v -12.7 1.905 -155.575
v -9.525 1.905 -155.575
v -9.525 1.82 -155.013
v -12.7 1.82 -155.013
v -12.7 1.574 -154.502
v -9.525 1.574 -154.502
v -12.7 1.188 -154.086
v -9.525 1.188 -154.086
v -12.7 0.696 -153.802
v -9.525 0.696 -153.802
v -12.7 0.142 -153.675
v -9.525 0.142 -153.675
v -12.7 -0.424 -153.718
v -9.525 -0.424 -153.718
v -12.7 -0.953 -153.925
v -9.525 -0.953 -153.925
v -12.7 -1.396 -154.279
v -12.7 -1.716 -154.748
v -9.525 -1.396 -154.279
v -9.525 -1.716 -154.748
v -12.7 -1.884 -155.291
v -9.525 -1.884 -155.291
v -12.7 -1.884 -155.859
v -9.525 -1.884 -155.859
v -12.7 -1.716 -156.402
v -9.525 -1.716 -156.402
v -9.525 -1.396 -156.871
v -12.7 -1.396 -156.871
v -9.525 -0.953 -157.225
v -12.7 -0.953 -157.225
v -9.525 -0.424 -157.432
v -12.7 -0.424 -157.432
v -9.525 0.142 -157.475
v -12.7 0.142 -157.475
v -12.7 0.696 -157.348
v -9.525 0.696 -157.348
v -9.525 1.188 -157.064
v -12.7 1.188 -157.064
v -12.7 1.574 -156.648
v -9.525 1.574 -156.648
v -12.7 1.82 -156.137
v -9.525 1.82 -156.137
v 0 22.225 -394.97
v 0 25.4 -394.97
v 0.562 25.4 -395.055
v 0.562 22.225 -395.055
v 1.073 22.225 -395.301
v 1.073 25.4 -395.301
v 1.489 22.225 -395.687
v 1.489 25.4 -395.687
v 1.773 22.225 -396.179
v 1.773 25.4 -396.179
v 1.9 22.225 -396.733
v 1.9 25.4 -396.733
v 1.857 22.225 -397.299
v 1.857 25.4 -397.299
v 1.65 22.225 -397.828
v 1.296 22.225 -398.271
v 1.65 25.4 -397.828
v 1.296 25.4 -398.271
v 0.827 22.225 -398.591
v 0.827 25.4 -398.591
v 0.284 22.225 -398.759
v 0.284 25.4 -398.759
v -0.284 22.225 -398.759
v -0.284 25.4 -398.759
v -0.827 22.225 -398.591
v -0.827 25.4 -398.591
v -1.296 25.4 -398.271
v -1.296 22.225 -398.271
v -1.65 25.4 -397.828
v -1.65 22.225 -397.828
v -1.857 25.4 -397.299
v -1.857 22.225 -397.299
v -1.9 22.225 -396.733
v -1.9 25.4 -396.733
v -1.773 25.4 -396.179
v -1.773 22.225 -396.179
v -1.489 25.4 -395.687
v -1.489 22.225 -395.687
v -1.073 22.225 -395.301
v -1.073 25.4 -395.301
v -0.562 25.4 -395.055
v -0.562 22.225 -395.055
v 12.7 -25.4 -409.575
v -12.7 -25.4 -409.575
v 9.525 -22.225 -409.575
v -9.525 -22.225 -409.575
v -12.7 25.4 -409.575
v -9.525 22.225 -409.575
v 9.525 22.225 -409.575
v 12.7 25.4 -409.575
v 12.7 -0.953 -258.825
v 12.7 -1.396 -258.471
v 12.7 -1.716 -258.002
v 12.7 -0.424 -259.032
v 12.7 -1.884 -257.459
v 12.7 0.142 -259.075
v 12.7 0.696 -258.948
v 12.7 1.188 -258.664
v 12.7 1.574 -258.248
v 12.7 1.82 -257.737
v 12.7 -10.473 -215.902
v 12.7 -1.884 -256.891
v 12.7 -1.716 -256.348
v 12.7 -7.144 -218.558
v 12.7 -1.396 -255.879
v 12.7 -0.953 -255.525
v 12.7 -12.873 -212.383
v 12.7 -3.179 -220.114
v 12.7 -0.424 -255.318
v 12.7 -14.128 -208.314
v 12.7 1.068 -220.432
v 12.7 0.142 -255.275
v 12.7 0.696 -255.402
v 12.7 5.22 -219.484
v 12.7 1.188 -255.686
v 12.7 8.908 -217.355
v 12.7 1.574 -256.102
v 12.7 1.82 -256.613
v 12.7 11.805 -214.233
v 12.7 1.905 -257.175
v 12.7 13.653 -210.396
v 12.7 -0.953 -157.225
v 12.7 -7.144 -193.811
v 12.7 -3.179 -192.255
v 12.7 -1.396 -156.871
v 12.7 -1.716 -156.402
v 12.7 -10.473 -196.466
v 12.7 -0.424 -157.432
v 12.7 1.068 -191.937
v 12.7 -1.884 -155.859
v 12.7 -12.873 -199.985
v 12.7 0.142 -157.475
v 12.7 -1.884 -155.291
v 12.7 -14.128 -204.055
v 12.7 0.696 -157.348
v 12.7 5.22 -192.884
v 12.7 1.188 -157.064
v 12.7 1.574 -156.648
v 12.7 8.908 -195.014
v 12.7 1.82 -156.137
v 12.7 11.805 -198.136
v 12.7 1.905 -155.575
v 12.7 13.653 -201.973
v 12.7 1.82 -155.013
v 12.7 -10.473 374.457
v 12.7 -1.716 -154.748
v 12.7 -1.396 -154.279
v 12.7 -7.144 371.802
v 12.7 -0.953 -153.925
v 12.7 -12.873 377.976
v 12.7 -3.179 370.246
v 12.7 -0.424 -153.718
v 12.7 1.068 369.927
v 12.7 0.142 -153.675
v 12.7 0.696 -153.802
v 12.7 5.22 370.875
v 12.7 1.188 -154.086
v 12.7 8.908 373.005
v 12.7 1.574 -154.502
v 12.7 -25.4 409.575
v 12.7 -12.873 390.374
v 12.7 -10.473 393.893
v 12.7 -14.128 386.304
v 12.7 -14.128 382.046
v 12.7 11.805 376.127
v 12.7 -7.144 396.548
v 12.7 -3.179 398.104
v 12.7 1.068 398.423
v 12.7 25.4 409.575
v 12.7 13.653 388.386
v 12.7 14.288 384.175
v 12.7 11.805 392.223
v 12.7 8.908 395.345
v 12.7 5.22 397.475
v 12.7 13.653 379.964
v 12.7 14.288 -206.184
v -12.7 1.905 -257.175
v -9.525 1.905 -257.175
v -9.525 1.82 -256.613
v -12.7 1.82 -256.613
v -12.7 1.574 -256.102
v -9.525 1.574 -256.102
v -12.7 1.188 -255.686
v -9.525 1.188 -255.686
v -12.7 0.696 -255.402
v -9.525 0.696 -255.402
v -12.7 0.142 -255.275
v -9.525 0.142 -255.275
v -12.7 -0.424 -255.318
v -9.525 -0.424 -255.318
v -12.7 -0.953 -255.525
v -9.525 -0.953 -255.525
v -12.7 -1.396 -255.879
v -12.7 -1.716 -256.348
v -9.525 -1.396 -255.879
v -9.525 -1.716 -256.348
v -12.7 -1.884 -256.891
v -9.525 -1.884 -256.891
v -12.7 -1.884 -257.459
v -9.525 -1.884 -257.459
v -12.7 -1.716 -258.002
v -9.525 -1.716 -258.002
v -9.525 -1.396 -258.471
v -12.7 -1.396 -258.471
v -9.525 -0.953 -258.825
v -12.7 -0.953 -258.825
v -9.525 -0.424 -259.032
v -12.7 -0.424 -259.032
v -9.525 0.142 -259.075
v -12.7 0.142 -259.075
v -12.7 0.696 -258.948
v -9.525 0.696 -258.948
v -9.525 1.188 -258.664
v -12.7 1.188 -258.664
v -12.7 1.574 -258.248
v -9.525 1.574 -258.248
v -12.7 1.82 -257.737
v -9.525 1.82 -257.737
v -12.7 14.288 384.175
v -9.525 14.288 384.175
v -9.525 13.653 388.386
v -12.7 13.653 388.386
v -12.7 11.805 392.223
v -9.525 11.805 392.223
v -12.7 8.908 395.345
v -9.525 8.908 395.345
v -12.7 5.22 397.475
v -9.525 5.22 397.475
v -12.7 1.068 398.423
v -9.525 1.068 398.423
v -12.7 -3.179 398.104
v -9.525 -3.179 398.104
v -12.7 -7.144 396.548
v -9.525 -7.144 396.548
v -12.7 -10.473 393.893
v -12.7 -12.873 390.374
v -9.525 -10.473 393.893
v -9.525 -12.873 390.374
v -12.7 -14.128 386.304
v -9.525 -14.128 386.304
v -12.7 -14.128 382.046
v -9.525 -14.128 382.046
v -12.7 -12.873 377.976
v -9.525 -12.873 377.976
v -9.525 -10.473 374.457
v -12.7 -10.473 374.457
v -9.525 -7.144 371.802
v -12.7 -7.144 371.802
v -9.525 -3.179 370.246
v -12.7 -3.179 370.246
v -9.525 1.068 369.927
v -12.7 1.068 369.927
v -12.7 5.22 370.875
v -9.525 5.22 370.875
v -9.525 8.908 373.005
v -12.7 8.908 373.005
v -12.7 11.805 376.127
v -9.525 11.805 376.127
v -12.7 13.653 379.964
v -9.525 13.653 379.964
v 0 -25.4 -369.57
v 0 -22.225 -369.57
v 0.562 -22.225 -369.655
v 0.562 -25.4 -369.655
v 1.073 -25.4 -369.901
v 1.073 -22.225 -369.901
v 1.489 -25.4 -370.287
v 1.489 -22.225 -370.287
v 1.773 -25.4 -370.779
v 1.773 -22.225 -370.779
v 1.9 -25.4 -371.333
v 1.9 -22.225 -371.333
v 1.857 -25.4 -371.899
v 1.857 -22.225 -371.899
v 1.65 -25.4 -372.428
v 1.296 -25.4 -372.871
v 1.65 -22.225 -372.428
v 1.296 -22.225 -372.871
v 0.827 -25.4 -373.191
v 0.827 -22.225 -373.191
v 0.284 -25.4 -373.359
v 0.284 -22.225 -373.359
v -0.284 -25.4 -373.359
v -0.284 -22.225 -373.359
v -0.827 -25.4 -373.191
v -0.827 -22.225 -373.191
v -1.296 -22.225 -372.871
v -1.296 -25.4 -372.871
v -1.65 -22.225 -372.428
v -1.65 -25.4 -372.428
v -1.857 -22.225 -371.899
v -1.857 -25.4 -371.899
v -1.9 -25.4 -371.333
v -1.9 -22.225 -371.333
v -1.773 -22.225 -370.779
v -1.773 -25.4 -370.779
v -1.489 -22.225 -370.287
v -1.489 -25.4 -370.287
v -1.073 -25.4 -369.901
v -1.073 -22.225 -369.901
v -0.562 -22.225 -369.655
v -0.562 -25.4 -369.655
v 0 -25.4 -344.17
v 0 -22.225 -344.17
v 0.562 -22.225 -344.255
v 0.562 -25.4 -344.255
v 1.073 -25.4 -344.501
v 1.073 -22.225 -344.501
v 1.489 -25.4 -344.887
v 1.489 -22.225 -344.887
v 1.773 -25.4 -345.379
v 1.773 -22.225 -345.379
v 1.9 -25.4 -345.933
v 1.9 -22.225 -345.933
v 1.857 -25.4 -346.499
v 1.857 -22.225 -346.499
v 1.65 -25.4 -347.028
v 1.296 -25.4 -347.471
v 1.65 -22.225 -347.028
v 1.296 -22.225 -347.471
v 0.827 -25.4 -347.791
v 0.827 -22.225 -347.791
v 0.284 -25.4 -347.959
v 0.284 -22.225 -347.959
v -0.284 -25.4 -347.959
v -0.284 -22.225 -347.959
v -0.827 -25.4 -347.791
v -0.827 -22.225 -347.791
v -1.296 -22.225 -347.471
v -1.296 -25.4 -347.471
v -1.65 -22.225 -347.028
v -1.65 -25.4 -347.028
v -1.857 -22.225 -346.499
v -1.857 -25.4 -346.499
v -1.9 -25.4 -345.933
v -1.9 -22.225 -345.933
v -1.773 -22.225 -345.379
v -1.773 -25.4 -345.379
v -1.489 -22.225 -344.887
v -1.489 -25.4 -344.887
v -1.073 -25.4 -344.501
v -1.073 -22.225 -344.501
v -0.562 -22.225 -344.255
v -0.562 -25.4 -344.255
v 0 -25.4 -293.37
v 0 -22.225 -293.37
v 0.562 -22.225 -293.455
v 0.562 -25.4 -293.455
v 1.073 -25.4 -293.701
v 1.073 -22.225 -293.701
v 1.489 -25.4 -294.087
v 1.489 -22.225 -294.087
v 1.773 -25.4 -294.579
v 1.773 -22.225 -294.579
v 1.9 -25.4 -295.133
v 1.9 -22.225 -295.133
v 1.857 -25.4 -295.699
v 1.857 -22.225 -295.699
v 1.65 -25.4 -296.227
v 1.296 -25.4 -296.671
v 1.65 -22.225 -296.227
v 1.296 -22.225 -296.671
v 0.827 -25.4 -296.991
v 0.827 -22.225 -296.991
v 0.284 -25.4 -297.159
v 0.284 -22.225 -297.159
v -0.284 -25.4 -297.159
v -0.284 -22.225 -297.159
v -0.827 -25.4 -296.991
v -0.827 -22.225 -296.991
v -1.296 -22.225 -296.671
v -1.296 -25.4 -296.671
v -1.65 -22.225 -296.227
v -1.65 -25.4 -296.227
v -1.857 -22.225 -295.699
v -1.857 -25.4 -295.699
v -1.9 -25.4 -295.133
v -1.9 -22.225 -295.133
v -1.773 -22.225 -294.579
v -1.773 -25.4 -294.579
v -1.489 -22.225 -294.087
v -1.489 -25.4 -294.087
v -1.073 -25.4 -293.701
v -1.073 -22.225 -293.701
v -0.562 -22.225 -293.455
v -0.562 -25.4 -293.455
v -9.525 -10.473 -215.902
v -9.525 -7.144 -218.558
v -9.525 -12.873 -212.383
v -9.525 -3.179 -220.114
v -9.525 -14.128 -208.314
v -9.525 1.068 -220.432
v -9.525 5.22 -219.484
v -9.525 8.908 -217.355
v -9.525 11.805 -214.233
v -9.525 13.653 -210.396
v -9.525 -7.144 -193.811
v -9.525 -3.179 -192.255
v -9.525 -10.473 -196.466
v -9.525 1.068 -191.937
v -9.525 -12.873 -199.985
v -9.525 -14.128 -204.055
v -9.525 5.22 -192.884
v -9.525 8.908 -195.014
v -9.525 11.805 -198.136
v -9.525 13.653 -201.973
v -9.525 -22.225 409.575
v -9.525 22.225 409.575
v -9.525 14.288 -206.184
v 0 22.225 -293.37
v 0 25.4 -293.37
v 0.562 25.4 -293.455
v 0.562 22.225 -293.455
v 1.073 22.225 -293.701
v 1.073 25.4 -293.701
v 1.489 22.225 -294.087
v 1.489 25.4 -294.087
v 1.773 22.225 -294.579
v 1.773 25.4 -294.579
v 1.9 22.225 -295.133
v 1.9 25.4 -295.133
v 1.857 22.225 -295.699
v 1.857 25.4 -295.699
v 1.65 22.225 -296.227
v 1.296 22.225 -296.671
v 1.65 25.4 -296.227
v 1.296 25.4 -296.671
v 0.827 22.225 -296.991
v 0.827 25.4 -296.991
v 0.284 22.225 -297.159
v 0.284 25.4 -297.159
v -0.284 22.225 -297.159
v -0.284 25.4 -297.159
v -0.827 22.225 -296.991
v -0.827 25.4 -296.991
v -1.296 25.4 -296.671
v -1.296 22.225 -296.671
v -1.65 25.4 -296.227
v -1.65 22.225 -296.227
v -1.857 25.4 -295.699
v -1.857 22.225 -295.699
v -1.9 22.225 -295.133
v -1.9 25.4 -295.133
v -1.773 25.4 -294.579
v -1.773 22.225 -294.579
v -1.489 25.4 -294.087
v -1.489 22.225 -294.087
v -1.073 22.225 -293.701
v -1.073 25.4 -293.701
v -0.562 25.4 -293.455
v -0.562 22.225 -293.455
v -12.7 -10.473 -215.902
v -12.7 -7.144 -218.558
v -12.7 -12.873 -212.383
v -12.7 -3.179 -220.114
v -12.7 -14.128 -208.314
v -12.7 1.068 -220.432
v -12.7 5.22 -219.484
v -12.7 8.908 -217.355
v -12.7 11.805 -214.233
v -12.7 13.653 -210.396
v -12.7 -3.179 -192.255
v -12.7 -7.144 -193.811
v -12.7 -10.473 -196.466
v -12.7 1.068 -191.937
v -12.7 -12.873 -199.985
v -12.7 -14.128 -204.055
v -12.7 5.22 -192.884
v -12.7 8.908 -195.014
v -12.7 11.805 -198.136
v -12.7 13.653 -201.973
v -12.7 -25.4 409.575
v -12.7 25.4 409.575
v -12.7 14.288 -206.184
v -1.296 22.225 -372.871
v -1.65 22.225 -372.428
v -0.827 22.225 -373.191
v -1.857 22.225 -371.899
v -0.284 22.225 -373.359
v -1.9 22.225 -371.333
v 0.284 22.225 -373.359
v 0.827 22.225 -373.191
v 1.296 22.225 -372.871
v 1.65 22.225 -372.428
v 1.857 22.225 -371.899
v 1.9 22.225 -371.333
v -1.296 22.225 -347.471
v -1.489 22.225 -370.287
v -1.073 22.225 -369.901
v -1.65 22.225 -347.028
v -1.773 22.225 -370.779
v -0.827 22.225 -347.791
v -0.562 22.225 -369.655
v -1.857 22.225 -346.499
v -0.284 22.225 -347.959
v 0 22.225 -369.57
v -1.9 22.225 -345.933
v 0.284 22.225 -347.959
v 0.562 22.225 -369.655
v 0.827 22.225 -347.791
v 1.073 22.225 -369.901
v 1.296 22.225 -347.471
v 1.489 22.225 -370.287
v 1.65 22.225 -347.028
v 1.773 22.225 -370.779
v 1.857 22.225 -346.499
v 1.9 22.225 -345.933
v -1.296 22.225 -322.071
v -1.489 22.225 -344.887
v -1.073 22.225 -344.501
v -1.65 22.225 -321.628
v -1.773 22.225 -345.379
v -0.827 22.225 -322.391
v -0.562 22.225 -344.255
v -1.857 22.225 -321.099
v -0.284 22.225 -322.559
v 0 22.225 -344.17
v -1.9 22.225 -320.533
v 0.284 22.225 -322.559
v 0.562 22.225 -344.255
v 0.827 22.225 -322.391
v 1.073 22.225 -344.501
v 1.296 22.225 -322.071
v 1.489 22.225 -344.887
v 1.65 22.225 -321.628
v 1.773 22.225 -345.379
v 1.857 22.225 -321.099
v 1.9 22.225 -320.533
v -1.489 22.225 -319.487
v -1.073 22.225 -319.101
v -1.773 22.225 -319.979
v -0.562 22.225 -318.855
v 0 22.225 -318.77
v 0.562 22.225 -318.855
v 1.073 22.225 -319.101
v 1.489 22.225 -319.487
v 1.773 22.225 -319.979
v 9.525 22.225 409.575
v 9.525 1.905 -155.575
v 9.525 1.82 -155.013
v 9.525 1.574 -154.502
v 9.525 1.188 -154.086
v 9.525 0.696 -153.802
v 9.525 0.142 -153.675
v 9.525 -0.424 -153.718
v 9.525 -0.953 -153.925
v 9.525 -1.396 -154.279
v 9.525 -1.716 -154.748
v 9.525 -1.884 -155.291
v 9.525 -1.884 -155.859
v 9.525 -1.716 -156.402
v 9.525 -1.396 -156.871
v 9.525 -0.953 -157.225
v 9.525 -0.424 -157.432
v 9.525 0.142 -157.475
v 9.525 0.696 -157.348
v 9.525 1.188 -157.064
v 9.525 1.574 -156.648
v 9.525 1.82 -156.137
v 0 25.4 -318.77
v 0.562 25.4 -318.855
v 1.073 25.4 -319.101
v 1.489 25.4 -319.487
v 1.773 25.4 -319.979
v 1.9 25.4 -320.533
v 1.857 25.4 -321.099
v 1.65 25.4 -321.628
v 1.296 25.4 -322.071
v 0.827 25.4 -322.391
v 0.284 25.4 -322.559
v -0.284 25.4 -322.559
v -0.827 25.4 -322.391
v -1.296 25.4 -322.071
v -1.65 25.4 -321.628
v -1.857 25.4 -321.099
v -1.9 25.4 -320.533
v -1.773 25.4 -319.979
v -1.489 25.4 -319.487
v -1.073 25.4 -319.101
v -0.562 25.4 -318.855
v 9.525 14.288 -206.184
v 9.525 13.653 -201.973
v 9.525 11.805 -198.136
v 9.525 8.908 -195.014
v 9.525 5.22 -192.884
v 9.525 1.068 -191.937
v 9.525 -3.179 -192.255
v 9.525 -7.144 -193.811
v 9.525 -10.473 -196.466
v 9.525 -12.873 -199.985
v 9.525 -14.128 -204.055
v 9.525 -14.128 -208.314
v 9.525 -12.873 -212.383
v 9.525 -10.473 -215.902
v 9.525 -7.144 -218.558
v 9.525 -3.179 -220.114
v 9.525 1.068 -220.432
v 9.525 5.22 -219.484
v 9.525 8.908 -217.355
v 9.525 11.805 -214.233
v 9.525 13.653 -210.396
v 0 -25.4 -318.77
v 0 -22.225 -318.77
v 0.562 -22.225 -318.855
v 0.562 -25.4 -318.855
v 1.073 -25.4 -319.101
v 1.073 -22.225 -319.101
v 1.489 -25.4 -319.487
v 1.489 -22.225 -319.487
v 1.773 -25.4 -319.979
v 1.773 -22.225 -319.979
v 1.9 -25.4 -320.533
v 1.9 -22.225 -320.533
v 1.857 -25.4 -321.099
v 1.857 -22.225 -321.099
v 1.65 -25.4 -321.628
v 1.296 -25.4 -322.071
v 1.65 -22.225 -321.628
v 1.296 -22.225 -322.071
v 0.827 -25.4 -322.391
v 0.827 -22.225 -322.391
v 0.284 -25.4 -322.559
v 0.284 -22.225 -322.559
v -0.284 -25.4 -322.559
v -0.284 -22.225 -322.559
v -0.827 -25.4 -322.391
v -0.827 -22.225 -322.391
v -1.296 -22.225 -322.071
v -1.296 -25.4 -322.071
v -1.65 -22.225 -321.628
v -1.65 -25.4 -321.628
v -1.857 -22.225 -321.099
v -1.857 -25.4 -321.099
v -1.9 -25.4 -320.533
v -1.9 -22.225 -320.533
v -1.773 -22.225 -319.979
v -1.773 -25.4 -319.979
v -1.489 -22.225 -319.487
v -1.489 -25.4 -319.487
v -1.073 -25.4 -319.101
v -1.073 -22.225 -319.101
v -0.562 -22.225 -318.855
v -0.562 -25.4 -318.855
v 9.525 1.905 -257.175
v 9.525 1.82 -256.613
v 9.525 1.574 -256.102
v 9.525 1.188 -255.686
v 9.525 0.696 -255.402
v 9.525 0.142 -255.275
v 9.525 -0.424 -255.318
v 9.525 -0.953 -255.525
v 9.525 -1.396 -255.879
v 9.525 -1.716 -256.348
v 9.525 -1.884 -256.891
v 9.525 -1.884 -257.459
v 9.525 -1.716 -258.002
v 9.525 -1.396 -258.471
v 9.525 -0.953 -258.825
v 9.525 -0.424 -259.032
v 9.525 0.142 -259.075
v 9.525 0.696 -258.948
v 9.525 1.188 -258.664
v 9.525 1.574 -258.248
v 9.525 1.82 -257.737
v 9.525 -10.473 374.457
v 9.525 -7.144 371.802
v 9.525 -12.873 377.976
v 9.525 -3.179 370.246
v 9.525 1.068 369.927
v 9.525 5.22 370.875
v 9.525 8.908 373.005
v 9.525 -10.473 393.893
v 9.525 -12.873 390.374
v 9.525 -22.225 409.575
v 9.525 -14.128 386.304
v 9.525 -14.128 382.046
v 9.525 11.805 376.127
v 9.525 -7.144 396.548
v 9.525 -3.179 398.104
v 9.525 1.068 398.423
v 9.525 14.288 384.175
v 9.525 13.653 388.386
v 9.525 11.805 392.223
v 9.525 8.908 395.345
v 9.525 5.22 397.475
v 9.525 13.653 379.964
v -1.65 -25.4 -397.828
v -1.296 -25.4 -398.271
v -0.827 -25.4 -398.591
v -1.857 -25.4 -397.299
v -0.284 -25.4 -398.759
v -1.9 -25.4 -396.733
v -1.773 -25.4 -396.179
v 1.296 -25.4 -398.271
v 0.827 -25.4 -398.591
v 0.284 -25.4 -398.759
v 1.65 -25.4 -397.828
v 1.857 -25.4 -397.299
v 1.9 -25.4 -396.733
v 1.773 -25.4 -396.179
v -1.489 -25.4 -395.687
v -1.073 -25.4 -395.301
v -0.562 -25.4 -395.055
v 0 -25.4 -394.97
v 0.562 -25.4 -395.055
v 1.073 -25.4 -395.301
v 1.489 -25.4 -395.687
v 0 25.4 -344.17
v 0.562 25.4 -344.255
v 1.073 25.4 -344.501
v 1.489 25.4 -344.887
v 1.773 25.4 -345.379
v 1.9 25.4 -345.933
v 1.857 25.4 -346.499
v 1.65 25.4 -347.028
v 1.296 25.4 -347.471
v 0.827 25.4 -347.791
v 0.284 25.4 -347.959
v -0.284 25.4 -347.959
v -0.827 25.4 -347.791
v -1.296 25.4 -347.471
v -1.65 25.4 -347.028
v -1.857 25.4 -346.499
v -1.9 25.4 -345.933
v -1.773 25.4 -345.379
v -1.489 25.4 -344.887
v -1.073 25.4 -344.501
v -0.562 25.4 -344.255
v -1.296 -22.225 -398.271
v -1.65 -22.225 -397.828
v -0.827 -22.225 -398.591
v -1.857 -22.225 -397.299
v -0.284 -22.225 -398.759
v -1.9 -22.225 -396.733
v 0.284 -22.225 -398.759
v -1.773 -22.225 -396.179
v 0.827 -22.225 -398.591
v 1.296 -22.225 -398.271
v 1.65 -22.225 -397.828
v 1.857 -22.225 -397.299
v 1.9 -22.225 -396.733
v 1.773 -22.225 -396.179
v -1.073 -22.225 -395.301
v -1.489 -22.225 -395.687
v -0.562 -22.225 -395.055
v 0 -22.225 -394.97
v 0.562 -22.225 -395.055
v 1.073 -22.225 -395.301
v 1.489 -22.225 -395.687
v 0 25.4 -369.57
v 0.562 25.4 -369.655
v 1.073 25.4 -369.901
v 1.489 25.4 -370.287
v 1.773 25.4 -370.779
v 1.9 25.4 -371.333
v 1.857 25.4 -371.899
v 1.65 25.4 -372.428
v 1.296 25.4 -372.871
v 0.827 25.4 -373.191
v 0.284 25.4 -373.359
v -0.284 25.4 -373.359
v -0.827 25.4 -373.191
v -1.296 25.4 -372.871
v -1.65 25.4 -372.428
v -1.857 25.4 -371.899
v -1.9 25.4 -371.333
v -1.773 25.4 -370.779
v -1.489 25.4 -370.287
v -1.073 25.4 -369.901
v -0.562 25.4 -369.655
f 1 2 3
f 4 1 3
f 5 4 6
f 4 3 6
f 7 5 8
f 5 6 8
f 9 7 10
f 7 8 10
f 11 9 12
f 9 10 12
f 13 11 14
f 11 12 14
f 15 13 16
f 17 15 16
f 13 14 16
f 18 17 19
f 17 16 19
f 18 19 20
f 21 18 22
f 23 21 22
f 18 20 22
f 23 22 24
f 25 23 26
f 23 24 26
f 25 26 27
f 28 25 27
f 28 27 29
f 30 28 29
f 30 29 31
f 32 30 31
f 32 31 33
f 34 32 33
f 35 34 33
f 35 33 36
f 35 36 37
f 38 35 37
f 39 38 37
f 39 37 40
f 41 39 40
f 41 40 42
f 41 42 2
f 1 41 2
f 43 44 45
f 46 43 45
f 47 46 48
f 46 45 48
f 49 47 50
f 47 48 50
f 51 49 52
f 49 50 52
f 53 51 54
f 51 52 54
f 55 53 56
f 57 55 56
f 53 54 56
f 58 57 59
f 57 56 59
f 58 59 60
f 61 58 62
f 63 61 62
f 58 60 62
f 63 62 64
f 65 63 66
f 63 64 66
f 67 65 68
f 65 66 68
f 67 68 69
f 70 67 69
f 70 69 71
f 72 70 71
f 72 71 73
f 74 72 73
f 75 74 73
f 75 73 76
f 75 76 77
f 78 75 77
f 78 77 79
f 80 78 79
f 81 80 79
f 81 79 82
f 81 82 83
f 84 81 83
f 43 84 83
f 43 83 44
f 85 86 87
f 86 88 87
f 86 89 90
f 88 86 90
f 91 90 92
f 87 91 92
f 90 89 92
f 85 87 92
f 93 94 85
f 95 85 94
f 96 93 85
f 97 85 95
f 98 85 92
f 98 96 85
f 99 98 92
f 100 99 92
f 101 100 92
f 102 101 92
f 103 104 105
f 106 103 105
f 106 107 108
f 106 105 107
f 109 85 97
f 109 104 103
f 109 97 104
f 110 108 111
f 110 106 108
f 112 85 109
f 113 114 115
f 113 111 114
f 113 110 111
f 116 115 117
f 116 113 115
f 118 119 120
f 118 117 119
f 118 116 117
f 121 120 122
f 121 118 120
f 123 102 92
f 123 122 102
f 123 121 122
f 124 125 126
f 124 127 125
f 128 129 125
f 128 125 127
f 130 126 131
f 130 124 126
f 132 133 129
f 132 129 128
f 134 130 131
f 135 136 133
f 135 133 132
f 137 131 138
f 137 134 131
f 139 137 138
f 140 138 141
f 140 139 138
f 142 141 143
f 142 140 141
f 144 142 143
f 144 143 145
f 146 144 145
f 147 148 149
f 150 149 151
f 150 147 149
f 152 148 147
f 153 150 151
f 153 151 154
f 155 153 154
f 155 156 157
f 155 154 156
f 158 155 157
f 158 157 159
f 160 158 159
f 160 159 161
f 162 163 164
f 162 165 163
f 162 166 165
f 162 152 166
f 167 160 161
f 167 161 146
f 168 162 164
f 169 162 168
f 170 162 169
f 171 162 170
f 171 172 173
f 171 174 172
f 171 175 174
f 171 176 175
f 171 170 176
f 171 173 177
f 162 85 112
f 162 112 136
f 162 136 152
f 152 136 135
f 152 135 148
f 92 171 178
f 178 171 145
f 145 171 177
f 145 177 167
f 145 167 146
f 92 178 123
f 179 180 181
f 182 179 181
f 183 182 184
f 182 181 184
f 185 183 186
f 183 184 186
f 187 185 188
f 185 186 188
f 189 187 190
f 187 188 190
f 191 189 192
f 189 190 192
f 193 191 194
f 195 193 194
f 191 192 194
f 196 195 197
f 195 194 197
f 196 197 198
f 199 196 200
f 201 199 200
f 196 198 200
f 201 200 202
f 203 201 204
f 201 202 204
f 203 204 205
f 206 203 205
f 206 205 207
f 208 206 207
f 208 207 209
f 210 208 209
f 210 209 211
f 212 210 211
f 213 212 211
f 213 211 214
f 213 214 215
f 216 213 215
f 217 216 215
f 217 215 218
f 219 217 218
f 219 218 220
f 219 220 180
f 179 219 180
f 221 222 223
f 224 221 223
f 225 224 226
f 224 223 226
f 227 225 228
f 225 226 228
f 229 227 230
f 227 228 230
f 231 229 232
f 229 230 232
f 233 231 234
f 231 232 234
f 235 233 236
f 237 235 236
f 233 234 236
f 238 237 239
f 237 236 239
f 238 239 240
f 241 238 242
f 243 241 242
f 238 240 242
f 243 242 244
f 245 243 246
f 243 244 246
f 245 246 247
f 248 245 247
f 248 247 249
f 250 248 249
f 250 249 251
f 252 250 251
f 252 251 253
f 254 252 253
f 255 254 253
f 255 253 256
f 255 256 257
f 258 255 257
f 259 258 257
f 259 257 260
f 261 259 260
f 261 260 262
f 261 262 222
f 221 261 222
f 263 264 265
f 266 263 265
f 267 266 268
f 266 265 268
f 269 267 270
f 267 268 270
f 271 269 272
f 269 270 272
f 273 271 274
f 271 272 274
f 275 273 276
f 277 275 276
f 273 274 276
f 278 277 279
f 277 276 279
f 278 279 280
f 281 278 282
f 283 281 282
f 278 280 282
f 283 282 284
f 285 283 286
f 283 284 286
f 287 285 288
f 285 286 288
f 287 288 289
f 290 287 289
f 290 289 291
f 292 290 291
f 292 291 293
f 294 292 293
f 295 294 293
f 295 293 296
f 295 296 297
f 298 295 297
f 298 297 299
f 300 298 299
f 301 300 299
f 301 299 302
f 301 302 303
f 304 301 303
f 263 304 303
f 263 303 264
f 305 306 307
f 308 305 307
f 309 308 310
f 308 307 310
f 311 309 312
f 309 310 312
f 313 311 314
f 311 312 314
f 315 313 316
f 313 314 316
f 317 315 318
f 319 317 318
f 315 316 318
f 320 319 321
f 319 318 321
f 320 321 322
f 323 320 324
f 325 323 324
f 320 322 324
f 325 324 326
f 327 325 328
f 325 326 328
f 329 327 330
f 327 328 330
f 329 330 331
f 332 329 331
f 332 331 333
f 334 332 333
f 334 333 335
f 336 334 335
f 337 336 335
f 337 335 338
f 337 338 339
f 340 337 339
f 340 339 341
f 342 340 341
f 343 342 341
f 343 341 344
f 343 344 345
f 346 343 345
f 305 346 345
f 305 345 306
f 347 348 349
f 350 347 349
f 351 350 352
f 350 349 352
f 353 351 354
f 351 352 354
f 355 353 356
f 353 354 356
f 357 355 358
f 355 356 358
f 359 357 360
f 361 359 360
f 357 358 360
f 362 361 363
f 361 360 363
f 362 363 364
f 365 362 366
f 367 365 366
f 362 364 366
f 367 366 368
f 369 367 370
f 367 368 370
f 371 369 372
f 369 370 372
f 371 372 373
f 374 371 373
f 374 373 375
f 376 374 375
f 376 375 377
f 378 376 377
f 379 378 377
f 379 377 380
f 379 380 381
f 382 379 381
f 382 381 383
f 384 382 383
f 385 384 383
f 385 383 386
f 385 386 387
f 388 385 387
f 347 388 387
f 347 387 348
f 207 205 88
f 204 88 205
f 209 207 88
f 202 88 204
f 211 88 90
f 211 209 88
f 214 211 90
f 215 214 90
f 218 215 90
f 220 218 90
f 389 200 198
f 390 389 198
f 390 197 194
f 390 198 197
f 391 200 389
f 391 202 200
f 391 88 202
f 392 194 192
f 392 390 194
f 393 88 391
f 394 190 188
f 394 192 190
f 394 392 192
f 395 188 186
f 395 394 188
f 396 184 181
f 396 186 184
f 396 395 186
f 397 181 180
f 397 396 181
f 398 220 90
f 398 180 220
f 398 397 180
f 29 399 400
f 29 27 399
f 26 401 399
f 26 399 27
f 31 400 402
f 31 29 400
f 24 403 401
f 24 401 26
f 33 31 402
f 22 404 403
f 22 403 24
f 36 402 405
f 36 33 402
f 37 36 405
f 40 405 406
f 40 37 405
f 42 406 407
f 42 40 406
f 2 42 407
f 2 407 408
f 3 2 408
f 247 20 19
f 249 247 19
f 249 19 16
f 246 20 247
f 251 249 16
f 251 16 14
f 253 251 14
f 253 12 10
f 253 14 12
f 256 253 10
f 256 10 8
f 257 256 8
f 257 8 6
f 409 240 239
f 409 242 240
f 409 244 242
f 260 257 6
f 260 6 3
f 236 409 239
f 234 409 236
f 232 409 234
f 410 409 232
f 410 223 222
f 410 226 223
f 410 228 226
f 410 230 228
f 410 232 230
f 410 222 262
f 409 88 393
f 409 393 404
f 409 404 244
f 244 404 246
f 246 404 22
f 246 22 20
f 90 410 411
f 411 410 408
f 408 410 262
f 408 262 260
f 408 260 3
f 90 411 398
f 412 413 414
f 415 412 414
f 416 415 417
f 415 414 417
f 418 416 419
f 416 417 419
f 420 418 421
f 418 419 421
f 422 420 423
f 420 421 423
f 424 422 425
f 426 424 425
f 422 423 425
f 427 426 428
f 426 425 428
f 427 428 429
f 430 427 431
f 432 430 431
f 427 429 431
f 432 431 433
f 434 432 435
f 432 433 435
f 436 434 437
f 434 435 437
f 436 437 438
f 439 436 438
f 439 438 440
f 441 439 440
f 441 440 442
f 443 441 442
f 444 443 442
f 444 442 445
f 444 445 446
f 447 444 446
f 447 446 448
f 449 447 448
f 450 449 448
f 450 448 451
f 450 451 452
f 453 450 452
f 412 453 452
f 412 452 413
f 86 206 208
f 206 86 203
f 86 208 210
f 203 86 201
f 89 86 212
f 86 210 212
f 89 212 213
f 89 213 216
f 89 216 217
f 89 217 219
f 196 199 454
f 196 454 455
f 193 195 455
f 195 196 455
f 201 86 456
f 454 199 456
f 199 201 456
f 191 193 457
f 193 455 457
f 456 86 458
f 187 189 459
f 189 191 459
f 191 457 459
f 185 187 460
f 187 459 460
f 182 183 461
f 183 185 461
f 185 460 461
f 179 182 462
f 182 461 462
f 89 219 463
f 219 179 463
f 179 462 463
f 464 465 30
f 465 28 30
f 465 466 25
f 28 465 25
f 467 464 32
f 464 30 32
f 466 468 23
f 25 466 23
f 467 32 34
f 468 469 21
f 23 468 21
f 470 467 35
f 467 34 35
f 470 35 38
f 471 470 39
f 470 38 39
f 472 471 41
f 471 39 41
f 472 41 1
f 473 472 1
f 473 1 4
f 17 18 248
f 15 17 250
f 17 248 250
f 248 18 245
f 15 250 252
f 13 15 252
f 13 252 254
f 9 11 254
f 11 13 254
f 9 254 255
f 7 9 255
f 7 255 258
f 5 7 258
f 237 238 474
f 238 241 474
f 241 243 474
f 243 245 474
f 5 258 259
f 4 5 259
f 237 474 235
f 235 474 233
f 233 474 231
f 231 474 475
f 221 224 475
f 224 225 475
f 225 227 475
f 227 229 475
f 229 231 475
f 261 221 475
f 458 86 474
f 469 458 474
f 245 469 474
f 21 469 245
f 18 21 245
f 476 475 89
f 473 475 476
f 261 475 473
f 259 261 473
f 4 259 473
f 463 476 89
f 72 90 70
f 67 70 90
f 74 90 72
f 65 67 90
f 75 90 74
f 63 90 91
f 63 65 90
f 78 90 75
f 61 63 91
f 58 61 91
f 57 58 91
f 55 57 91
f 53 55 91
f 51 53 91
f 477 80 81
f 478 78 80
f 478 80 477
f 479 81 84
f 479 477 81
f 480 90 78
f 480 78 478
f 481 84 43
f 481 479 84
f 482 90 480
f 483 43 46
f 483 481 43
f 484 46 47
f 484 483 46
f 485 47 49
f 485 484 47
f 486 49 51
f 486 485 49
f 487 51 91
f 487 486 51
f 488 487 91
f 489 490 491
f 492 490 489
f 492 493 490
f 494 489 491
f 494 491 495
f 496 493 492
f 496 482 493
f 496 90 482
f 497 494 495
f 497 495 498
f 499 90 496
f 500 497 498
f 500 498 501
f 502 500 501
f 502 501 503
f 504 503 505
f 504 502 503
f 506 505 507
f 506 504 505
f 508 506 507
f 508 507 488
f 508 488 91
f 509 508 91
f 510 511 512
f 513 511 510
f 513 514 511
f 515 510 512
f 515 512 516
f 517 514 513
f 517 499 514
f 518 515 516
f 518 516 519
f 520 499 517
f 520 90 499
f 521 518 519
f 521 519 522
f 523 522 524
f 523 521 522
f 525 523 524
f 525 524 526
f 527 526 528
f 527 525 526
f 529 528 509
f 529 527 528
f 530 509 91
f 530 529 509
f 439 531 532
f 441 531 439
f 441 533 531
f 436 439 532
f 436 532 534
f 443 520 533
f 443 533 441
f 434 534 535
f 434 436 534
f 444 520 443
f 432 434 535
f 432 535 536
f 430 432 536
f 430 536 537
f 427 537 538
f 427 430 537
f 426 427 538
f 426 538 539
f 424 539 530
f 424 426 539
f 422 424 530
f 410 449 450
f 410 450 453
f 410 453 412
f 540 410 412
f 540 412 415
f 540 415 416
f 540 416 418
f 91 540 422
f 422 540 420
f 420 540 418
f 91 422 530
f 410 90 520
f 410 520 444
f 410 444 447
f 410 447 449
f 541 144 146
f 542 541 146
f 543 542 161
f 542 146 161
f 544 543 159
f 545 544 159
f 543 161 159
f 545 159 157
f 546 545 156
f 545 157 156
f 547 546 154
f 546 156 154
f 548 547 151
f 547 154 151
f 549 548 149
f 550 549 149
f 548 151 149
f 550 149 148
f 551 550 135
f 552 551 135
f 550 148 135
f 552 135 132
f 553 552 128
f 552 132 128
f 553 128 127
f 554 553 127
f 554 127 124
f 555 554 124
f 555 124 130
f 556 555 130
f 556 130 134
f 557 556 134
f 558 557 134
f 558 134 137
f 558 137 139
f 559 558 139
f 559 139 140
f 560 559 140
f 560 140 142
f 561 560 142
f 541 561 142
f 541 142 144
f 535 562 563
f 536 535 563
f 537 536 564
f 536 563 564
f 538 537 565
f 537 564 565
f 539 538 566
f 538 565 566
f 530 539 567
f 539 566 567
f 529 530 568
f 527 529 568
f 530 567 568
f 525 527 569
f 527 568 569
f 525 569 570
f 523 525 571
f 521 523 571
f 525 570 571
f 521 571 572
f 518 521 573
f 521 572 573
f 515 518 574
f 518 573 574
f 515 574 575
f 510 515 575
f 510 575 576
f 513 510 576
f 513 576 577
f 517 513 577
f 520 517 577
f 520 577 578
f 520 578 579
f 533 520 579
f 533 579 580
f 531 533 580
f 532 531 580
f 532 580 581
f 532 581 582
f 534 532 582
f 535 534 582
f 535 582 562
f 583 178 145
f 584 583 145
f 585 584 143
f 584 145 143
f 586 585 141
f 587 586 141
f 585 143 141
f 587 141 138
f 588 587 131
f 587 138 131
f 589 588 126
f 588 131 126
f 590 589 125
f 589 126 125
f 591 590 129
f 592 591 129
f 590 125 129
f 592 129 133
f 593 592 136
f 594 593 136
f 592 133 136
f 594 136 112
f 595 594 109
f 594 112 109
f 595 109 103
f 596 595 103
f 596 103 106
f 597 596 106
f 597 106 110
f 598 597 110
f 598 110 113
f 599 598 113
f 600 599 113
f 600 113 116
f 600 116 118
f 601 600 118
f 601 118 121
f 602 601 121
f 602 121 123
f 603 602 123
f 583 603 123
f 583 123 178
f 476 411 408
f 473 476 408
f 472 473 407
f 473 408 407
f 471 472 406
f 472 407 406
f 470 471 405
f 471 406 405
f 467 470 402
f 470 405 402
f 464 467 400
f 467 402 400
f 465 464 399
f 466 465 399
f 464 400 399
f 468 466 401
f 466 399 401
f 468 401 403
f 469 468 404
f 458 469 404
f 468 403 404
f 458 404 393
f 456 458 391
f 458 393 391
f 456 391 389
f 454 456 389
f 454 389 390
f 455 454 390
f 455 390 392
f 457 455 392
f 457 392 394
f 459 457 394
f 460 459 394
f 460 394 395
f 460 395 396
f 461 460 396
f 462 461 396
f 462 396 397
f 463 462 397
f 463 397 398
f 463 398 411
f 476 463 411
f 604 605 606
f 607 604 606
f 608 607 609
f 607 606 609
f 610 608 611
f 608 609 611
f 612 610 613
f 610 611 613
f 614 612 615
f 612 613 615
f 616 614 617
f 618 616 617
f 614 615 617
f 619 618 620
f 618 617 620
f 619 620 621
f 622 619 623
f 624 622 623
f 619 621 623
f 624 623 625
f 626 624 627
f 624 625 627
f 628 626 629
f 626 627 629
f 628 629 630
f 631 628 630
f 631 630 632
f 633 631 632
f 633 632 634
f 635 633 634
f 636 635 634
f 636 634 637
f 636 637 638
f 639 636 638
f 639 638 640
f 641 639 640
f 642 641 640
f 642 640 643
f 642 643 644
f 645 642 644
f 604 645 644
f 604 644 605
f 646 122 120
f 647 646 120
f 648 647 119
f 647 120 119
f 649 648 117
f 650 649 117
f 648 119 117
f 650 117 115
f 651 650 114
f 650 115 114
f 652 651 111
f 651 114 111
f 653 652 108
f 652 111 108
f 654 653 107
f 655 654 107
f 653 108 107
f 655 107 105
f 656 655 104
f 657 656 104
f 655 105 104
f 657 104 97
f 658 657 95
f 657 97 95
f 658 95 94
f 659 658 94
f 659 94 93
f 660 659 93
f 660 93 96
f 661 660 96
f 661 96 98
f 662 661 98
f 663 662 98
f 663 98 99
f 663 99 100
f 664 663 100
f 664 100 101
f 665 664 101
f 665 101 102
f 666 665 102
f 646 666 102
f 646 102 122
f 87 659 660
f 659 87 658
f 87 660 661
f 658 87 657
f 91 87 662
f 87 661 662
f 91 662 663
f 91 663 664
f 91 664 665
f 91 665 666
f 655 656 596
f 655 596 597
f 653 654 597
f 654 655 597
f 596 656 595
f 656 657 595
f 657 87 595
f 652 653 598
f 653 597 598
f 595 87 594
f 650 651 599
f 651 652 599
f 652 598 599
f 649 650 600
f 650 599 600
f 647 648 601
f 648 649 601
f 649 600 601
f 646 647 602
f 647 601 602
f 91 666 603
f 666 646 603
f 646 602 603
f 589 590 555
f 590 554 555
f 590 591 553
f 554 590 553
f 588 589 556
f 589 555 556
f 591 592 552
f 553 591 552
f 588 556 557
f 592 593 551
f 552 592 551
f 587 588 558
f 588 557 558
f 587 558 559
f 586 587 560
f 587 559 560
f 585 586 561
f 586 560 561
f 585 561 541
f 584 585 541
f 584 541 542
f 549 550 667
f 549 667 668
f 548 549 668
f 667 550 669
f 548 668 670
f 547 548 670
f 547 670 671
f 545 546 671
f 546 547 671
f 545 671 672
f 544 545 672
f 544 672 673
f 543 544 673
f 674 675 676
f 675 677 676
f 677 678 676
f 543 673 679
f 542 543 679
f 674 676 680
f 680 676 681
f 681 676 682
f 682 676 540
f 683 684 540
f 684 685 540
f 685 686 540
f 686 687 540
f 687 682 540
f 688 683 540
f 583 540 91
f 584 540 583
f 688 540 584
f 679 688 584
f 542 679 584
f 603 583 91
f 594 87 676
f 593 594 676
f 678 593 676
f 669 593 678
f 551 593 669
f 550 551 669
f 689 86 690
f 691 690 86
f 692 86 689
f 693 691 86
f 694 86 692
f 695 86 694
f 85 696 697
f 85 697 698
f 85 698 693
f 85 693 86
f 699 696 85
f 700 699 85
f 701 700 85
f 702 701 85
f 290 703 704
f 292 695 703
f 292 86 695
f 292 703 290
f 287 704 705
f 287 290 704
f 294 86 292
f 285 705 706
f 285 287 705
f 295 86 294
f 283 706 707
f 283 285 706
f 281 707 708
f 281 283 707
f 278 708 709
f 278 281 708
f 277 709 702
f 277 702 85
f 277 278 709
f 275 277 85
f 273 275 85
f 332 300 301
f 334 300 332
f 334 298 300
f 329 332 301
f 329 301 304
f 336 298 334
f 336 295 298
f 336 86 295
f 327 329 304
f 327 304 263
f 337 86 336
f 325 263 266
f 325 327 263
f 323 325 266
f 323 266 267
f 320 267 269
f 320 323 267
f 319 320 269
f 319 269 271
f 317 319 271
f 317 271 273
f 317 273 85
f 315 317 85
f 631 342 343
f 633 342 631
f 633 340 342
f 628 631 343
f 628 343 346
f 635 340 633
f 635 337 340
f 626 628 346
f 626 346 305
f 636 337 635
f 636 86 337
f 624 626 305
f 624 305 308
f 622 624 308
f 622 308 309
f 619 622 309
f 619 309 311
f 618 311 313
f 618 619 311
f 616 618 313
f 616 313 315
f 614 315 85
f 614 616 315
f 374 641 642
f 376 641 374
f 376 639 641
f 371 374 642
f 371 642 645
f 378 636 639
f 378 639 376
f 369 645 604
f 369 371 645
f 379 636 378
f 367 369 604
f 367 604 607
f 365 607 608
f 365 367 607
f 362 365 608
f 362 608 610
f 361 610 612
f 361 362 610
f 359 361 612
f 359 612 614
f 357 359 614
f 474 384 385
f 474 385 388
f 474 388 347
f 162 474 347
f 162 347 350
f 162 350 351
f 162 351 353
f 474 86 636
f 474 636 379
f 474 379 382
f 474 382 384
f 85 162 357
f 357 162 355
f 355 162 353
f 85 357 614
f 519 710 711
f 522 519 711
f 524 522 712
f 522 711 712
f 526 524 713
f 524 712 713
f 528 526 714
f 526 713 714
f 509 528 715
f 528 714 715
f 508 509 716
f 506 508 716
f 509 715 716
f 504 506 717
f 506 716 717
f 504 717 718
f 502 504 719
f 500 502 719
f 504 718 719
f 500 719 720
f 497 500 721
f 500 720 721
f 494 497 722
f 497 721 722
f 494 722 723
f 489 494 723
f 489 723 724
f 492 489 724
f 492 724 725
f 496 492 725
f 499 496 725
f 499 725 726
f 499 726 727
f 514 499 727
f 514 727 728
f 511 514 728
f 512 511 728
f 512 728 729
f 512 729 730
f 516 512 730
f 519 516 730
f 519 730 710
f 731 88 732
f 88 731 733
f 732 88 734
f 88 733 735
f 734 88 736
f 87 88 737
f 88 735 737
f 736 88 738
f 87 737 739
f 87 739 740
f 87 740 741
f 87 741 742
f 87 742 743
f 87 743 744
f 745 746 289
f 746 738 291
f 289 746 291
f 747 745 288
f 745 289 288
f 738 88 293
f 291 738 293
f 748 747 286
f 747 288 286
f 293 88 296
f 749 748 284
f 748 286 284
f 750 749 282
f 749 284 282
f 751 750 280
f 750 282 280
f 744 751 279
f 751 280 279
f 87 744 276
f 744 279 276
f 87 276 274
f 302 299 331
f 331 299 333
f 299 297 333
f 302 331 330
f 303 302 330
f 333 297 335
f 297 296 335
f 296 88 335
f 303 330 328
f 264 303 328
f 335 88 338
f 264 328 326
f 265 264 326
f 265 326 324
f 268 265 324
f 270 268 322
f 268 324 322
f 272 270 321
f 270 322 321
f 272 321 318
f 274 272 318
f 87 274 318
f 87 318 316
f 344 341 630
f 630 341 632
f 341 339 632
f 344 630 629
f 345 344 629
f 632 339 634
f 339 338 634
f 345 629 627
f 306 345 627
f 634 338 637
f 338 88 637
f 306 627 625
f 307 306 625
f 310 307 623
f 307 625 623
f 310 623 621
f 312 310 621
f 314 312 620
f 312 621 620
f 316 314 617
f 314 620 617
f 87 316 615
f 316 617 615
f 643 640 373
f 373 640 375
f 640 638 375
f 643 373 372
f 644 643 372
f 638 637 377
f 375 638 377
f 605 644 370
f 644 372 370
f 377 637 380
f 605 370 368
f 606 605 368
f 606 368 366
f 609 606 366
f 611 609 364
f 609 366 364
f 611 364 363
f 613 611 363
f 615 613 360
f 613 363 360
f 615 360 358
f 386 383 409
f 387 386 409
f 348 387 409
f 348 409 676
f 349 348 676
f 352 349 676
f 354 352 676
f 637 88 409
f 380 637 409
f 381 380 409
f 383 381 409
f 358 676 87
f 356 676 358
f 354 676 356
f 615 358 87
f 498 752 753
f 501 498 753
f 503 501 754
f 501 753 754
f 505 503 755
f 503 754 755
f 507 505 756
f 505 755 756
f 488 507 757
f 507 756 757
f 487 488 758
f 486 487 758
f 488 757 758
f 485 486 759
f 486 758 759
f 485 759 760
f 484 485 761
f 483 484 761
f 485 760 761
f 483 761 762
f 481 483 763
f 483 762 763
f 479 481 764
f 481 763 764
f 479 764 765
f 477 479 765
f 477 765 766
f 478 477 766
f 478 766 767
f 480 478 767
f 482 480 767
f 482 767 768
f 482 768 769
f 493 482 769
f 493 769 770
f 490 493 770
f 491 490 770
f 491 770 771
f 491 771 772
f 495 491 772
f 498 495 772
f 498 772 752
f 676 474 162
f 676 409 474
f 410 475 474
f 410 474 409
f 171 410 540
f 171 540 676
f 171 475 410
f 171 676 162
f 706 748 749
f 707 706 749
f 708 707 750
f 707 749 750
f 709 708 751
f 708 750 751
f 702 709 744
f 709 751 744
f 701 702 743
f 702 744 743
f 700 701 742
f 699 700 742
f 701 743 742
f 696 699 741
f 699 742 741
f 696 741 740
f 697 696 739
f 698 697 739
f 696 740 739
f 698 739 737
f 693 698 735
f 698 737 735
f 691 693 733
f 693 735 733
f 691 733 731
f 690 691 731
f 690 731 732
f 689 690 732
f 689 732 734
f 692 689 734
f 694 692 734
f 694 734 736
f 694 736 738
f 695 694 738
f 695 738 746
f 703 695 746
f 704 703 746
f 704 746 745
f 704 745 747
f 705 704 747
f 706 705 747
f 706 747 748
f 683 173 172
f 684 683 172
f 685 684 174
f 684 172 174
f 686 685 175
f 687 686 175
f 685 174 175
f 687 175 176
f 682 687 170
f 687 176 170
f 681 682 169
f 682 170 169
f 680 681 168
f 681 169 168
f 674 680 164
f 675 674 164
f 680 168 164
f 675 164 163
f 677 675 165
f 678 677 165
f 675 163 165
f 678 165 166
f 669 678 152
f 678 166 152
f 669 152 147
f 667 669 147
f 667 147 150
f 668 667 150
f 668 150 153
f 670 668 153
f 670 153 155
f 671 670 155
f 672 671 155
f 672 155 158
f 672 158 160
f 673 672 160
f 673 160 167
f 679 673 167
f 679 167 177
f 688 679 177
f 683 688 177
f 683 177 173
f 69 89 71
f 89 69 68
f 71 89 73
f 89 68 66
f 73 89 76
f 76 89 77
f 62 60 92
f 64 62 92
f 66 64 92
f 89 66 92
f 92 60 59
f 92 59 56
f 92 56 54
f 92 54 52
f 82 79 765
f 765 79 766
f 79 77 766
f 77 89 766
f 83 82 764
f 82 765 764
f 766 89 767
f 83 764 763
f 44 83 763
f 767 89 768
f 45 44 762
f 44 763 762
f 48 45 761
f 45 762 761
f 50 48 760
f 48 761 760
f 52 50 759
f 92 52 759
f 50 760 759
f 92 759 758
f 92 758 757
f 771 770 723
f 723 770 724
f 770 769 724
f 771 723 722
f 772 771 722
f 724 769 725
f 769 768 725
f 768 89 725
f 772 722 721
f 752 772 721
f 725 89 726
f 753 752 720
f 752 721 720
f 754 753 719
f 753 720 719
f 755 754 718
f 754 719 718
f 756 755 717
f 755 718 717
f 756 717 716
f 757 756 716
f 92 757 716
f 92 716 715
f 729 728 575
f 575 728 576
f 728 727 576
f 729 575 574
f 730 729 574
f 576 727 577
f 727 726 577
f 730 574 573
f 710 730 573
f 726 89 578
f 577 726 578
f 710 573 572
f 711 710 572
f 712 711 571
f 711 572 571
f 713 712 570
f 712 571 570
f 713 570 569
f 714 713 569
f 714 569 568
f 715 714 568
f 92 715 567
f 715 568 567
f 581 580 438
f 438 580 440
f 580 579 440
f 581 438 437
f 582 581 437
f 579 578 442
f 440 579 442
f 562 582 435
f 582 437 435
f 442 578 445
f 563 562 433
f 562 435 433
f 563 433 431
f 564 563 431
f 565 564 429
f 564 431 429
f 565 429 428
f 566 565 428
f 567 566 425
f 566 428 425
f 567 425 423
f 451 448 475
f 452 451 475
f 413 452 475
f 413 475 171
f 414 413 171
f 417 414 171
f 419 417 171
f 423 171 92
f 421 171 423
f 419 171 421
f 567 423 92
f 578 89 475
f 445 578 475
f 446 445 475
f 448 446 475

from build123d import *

# Parameters (mm, degrees)
SKETCH1_W           = 25.4
SKETCH1_H           = 50.8
SKETCH1_W_2         = 19.05
SKETCH1_H_2         = 44.45
BOSS_EXTRUDE1_DEPTH = 409.575
SKETCH7_R           = 1.905
CUT_EXTRUDE1_DEPTH  = 413.908719483
SKETCH8_R           = 1.905
SKETCH8_R_2         = 14.2875
CUT_EXTRUDE2_DEPTH  = 412.147176355


with BuildPart() as part:
    # Sketch1 → Boss-Extrude1 (new, symmetric)
    with BuildSketch(Plane.XY):
        Rectangle(SKETCH1_W, SKETCH1_H)
        Rectangle(SKETCH1_W_2, SKETCH1_H_2, mode=Mode.SUBTRACT)
    extrude(amount=BOSS_EXTRUDE1_DEPTH, both=True)

    # Sketch7 → Cut-Extrude1 (cut, through all)
    with BuildSketch(Plane(origin=(0, 25.4, 0), x_dir=(1, 0, 0), z_dir=(0, 1, 0))):
        with Locations(Location((0, 396.875, 0), (0, 0, 270))):
            Circle(SKETCH7_R)
        with Locations(Location((0, 371.475, 0), (0, 0, 270))):
            Circle(SKETCH7_R)
        with Locations(Location((0, 346.075, 0), (0, 0, 270))):
            Circle(SKETCH7_R)
        with Locations(Location((0, 320.675, 0), (0, 0, 270))):
            Circle(SKETCH7_R)
        with Locations(Location((0, 295.275, 0), (0, 0, 270))):
            Circle(SKETCH7_R)
    extrude(amount=-CUT_EXTRUDE1_DEPTH, mode=Mode.SUBTRACT)

    # Sketch8 → Cut-Extrude2 (cut, through all)
    with BuildSketch(Plane(origin=(12.7, 0, 0), x_dir=(0, 0, -1), z_dir=(1, 0, 0))):
        with Locations(Location((155.575, 0, 0), (0, 0, 90))):
            Circle(SKETCH8_R)
        with Locations(Location((257.175, 0, 0), (0, 0, 90))):
            Circle(SKETCH8_R)
        with Locations(Location((206.184267809, 0, 0), (0, 0, 90))):
            Circle(SKETCH8_R_2)
        with Locations(Location((-384.175, 0, 0), (0, 0, 90))):
            Circle(SKETCH8_R_2)
    extrude(amount=-CUT_EXTRUDE2_DEPTH, mode=Mode.SUBTRACT)


solid = part.part
